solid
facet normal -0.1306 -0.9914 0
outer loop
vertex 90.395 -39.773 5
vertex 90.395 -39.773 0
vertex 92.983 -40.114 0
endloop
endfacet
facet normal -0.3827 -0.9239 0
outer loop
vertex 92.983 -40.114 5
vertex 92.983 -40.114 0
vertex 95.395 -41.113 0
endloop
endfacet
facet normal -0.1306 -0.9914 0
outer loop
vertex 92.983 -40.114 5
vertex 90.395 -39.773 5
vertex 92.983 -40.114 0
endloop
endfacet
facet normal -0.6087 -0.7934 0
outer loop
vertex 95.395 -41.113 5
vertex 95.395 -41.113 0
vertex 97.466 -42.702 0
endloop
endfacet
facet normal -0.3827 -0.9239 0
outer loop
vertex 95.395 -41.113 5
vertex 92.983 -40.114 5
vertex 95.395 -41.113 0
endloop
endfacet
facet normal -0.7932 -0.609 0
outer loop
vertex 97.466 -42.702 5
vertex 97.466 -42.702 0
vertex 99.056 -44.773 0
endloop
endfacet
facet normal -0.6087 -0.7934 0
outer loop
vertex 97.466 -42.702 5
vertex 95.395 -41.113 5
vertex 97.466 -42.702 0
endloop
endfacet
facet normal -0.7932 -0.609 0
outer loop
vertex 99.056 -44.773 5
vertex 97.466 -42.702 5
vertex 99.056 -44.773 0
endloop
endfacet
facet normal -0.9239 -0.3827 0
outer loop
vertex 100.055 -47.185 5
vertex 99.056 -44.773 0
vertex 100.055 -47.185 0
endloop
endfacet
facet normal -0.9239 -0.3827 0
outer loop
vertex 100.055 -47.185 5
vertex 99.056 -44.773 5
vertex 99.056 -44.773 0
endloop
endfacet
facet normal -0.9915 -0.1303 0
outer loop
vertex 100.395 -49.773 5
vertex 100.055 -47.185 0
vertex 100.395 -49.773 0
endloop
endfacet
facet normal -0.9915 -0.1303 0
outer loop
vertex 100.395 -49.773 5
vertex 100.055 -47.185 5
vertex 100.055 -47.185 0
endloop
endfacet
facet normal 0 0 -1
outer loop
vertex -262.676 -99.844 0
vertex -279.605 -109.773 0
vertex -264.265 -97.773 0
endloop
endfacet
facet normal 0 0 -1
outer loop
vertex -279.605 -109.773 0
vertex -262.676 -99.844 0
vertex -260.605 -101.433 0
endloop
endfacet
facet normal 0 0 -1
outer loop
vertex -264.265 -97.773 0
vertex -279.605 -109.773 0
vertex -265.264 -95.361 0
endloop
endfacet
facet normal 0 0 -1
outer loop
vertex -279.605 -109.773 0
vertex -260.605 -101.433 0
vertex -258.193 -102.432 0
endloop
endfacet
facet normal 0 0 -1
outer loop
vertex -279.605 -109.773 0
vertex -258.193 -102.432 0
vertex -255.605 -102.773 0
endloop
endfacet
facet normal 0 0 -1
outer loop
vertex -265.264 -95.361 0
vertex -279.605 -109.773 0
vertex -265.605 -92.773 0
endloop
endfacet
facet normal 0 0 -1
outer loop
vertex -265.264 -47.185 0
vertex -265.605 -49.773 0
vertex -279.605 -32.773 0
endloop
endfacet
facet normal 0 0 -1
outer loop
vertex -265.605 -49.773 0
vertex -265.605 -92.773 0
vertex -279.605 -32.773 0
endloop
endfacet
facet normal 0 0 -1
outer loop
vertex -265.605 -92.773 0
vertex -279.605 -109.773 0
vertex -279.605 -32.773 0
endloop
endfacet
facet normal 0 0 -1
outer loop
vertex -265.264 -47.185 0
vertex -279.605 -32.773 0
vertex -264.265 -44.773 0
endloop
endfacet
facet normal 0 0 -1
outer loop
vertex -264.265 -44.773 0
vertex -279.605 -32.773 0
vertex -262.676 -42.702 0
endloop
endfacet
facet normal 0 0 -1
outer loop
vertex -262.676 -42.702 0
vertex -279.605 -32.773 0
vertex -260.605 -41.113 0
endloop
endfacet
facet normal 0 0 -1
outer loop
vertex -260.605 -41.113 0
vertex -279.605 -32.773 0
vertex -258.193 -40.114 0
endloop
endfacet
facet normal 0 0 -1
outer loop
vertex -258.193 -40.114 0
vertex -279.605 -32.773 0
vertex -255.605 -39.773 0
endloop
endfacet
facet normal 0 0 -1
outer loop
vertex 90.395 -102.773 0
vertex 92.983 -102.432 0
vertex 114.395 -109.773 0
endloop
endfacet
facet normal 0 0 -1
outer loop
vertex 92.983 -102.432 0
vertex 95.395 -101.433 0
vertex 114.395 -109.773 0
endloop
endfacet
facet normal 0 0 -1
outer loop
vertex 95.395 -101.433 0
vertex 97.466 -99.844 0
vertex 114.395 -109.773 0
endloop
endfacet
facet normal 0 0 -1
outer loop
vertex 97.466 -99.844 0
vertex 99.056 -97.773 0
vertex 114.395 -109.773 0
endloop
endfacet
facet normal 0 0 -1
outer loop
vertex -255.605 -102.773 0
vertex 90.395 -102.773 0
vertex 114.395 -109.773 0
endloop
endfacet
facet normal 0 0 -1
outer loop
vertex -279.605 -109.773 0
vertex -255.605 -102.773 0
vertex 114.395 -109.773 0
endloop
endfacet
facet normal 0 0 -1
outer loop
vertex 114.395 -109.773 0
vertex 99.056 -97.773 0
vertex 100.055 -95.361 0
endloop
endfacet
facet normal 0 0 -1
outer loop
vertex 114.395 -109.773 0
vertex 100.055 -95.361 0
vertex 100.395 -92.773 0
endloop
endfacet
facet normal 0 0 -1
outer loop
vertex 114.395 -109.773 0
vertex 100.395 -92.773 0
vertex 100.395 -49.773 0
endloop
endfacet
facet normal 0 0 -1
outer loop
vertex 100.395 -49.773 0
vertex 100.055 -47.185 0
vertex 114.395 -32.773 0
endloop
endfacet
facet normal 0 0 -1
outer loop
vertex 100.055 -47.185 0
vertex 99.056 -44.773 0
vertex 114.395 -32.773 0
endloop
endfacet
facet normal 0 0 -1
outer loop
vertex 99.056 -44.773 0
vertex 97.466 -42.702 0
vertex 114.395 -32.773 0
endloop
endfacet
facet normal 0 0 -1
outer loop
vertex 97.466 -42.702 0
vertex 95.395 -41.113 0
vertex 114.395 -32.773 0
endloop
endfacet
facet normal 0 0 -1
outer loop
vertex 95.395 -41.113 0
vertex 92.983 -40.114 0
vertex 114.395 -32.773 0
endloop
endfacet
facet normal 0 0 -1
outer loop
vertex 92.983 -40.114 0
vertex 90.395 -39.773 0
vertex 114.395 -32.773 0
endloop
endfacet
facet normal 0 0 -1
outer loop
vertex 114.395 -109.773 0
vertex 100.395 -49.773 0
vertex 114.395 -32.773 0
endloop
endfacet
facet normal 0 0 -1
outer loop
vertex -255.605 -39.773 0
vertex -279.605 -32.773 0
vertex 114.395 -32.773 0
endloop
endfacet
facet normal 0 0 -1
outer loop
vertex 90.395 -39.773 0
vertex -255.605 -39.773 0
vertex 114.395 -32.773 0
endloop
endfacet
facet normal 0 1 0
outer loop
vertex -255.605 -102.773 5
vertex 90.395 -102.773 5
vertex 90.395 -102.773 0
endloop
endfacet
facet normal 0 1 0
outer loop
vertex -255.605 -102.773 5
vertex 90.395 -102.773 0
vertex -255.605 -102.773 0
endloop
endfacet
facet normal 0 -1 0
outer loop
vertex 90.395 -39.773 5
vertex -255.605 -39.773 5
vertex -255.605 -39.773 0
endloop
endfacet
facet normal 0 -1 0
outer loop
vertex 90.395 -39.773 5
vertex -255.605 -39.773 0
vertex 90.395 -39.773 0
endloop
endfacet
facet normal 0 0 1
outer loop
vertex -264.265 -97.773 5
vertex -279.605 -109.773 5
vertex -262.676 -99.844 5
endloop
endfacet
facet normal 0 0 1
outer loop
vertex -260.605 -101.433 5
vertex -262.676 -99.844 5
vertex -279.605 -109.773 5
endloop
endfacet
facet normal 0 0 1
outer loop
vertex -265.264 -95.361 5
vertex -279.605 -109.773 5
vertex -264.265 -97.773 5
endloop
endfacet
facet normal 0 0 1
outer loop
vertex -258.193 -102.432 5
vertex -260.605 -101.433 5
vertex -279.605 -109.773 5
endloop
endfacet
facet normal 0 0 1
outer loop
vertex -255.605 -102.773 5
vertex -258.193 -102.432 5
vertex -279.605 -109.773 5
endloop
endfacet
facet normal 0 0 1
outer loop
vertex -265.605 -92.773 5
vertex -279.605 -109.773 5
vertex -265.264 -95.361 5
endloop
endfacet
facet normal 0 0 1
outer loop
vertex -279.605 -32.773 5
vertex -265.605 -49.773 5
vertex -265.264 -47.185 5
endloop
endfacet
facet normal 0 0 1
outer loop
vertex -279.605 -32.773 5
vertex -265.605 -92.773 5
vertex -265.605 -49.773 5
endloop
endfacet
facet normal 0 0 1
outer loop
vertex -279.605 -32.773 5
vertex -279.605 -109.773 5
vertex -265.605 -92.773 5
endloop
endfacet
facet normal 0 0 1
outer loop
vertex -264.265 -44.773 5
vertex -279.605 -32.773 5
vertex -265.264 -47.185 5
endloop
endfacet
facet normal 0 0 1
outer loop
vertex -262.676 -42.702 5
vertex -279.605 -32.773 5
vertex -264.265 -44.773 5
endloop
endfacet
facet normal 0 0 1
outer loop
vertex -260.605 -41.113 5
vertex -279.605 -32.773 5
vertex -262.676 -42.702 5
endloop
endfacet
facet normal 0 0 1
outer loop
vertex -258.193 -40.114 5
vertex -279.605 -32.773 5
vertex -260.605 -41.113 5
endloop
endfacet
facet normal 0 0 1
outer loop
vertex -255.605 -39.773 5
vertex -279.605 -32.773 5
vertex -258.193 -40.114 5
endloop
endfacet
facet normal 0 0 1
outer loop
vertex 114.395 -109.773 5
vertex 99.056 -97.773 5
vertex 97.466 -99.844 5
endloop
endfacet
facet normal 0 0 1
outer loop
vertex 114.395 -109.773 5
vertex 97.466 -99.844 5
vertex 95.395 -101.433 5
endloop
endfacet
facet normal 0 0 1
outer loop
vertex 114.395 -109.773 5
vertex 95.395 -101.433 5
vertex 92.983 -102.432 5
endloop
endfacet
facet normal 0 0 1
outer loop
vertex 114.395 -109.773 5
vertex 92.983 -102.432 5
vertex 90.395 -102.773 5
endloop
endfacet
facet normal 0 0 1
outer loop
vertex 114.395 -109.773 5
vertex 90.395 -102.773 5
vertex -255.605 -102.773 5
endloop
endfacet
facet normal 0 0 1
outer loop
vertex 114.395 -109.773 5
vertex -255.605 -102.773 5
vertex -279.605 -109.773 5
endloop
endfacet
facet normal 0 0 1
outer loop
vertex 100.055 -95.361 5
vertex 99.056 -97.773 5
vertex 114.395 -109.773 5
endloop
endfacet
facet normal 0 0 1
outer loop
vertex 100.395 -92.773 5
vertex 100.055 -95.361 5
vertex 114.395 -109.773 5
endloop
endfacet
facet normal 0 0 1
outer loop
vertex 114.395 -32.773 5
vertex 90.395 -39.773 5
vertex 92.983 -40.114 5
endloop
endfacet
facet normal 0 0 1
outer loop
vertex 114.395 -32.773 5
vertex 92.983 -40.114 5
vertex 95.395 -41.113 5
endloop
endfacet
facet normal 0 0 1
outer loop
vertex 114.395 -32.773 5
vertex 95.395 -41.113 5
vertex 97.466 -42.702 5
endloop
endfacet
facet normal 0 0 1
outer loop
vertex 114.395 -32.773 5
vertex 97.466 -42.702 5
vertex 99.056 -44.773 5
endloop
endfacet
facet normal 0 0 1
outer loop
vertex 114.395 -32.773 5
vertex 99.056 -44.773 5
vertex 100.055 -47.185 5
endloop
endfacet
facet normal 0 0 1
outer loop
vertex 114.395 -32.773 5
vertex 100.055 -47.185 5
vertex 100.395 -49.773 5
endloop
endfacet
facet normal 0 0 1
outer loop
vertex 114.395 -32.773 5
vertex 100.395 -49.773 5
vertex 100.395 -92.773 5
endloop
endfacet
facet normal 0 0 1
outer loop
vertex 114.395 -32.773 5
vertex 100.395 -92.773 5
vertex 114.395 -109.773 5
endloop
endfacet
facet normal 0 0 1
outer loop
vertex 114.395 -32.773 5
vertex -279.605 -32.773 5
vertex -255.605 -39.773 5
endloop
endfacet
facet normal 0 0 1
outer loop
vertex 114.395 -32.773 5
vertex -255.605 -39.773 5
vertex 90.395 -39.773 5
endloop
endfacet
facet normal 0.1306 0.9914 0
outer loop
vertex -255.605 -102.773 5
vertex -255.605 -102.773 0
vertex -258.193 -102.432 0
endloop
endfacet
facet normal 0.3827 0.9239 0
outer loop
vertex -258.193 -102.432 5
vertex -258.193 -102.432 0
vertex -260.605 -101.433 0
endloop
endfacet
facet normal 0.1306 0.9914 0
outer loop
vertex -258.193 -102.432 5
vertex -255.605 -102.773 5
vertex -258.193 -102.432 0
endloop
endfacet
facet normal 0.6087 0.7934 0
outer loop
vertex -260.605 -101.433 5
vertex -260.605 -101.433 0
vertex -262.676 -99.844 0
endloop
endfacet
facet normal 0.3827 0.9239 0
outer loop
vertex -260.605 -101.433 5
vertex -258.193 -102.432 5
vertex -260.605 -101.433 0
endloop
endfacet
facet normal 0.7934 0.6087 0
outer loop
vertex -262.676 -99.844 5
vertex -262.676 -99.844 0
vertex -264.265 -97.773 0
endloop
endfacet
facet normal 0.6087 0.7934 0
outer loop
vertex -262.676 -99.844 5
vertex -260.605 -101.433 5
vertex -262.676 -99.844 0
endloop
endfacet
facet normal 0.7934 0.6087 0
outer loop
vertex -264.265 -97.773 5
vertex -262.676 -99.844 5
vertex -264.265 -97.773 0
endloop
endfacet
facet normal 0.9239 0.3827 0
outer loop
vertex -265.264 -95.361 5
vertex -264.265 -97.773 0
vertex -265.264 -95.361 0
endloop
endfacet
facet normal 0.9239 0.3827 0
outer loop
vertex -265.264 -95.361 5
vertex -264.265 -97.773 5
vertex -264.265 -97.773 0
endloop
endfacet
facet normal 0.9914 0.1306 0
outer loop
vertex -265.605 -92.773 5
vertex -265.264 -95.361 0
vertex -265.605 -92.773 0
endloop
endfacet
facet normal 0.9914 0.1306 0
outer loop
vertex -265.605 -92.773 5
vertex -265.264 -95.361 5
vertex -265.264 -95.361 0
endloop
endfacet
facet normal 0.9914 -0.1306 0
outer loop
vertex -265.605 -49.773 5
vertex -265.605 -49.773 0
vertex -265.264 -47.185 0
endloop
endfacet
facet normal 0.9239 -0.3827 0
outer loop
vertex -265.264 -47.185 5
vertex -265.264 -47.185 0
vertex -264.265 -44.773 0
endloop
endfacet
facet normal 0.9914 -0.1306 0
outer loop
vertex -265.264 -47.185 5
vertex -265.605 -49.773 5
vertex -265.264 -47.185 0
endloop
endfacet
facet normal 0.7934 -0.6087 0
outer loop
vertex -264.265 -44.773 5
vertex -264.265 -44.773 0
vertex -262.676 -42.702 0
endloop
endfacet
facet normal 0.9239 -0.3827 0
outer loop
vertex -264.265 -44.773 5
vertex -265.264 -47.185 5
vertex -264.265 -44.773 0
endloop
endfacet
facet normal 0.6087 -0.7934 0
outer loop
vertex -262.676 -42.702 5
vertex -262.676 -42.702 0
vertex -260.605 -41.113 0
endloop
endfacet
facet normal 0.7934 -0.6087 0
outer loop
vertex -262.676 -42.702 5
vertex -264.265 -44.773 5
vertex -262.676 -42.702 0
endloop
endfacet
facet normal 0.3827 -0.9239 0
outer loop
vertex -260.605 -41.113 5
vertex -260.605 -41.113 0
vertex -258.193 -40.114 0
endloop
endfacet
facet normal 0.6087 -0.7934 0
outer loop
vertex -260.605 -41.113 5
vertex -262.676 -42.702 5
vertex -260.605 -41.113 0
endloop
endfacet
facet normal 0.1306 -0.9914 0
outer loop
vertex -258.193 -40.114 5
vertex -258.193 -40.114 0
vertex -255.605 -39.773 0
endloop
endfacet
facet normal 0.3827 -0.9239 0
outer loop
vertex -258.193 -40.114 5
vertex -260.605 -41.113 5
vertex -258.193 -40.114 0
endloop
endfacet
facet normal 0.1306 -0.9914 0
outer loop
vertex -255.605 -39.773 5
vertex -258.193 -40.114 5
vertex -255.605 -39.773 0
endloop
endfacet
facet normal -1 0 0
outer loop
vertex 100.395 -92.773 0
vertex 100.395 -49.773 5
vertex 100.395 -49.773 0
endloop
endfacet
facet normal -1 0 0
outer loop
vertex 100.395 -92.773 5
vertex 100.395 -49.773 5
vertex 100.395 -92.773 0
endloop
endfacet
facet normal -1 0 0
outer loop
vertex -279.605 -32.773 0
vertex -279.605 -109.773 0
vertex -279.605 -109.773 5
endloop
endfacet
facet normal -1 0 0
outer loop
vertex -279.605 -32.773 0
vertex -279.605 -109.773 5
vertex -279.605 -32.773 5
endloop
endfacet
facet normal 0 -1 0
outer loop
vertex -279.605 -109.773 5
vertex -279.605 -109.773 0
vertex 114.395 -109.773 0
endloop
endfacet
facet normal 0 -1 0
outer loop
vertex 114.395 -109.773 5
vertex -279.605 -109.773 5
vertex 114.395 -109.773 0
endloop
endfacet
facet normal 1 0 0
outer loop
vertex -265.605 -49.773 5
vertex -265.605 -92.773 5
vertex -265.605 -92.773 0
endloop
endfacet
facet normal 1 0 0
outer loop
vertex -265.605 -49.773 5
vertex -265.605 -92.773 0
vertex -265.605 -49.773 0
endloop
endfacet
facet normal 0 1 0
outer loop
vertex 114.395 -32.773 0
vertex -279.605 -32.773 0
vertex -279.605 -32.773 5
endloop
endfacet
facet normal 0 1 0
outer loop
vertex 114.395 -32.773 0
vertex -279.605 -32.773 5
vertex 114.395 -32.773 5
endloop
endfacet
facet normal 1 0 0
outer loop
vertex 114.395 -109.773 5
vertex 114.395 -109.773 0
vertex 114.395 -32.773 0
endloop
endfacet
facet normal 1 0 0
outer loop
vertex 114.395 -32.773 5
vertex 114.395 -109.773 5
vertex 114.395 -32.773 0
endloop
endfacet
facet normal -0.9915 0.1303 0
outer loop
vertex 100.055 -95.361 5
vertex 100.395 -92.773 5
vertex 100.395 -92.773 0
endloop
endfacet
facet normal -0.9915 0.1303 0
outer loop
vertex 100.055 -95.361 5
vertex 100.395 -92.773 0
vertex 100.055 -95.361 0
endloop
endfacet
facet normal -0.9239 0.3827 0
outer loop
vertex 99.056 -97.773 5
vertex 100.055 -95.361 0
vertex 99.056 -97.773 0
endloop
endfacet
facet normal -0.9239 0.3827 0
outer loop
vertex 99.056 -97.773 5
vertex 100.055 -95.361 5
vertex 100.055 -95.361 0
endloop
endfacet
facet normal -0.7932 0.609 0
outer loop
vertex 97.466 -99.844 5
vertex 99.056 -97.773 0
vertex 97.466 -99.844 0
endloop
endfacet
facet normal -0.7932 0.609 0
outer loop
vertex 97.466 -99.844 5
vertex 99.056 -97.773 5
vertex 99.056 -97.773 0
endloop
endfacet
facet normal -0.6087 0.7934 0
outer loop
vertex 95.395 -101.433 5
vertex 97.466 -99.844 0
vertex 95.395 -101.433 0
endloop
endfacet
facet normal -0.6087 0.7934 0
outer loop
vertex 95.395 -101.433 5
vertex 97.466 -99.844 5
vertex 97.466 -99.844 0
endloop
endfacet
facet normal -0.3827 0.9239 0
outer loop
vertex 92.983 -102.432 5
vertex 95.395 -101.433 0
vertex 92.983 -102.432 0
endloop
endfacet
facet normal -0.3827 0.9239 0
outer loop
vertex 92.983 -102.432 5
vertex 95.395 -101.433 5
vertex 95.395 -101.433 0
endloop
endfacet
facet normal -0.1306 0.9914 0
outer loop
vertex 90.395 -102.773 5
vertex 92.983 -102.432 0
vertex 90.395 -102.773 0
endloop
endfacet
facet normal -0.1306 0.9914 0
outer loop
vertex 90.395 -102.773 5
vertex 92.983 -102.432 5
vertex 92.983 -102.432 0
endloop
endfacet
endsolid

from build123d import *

# Parameters (mm, degrees)
SZKIC1_W                    = 394
SZKIC1_H                    = 77
DODANIE_WYCI_GNI_CIE1_DEPTH = 5
WYTNIJ_WYCI_GNI_CIE1_DEPTH  = 10


with BuildPart() as part:
    # Szkic1 → Dodanie-wyciągnięcie1 (new body)
    with BuildSketch(Plane.XY):
        with Locations((-82.604690639, -71.272983114)):
            Rectangle(SZKIC1_W, SZKIC1_H)
    extrude(amount=DODANIE_WYCI_GNI_CIE1_DEPTH)

    # Szkic2 → Wytnij-wyciągnięcie1 (cut)
    with BuildSketch(Plane.XY.offset(5)):
        with BuildLine():
            Line((-255.604690639, -39.772983114), (90.395309361, -39.772983114))
            ThreePointArc((90.395309361, -39.772983114), (97.466377173, -42.701915303), (100.395309361, -49.772983114))
            Line((100.395309361, -49.772983114), (100.395309361, -92.772983114))
            ThreePointArc((100.395309361, -92.772983114), (97.466377173, -99.844050926), (90.395309361, -102.772983114))
            Line((90.395309361, -102.772983114), (-255.604690639, -102.772983114))
            ThreePointArc((-255.604690639, -102.772983114), (-262.675758451, -99.844050926), (-265.604690639, -92.772983114))
            Line((-265.604690639, -92.772983114), (-265.604690639, -49.772983114))
            ThreePointArc((-265.604690639, -49.772983114), (-262.675758451, -42.701915303), (-255.604690639, -39.772983114))
        make_face()
    extrude(amount=-WYTNIJ_WYCI_GNI_CIE1_DEPTH, mode=Mode.SUBTRACT)


solid = part.part
